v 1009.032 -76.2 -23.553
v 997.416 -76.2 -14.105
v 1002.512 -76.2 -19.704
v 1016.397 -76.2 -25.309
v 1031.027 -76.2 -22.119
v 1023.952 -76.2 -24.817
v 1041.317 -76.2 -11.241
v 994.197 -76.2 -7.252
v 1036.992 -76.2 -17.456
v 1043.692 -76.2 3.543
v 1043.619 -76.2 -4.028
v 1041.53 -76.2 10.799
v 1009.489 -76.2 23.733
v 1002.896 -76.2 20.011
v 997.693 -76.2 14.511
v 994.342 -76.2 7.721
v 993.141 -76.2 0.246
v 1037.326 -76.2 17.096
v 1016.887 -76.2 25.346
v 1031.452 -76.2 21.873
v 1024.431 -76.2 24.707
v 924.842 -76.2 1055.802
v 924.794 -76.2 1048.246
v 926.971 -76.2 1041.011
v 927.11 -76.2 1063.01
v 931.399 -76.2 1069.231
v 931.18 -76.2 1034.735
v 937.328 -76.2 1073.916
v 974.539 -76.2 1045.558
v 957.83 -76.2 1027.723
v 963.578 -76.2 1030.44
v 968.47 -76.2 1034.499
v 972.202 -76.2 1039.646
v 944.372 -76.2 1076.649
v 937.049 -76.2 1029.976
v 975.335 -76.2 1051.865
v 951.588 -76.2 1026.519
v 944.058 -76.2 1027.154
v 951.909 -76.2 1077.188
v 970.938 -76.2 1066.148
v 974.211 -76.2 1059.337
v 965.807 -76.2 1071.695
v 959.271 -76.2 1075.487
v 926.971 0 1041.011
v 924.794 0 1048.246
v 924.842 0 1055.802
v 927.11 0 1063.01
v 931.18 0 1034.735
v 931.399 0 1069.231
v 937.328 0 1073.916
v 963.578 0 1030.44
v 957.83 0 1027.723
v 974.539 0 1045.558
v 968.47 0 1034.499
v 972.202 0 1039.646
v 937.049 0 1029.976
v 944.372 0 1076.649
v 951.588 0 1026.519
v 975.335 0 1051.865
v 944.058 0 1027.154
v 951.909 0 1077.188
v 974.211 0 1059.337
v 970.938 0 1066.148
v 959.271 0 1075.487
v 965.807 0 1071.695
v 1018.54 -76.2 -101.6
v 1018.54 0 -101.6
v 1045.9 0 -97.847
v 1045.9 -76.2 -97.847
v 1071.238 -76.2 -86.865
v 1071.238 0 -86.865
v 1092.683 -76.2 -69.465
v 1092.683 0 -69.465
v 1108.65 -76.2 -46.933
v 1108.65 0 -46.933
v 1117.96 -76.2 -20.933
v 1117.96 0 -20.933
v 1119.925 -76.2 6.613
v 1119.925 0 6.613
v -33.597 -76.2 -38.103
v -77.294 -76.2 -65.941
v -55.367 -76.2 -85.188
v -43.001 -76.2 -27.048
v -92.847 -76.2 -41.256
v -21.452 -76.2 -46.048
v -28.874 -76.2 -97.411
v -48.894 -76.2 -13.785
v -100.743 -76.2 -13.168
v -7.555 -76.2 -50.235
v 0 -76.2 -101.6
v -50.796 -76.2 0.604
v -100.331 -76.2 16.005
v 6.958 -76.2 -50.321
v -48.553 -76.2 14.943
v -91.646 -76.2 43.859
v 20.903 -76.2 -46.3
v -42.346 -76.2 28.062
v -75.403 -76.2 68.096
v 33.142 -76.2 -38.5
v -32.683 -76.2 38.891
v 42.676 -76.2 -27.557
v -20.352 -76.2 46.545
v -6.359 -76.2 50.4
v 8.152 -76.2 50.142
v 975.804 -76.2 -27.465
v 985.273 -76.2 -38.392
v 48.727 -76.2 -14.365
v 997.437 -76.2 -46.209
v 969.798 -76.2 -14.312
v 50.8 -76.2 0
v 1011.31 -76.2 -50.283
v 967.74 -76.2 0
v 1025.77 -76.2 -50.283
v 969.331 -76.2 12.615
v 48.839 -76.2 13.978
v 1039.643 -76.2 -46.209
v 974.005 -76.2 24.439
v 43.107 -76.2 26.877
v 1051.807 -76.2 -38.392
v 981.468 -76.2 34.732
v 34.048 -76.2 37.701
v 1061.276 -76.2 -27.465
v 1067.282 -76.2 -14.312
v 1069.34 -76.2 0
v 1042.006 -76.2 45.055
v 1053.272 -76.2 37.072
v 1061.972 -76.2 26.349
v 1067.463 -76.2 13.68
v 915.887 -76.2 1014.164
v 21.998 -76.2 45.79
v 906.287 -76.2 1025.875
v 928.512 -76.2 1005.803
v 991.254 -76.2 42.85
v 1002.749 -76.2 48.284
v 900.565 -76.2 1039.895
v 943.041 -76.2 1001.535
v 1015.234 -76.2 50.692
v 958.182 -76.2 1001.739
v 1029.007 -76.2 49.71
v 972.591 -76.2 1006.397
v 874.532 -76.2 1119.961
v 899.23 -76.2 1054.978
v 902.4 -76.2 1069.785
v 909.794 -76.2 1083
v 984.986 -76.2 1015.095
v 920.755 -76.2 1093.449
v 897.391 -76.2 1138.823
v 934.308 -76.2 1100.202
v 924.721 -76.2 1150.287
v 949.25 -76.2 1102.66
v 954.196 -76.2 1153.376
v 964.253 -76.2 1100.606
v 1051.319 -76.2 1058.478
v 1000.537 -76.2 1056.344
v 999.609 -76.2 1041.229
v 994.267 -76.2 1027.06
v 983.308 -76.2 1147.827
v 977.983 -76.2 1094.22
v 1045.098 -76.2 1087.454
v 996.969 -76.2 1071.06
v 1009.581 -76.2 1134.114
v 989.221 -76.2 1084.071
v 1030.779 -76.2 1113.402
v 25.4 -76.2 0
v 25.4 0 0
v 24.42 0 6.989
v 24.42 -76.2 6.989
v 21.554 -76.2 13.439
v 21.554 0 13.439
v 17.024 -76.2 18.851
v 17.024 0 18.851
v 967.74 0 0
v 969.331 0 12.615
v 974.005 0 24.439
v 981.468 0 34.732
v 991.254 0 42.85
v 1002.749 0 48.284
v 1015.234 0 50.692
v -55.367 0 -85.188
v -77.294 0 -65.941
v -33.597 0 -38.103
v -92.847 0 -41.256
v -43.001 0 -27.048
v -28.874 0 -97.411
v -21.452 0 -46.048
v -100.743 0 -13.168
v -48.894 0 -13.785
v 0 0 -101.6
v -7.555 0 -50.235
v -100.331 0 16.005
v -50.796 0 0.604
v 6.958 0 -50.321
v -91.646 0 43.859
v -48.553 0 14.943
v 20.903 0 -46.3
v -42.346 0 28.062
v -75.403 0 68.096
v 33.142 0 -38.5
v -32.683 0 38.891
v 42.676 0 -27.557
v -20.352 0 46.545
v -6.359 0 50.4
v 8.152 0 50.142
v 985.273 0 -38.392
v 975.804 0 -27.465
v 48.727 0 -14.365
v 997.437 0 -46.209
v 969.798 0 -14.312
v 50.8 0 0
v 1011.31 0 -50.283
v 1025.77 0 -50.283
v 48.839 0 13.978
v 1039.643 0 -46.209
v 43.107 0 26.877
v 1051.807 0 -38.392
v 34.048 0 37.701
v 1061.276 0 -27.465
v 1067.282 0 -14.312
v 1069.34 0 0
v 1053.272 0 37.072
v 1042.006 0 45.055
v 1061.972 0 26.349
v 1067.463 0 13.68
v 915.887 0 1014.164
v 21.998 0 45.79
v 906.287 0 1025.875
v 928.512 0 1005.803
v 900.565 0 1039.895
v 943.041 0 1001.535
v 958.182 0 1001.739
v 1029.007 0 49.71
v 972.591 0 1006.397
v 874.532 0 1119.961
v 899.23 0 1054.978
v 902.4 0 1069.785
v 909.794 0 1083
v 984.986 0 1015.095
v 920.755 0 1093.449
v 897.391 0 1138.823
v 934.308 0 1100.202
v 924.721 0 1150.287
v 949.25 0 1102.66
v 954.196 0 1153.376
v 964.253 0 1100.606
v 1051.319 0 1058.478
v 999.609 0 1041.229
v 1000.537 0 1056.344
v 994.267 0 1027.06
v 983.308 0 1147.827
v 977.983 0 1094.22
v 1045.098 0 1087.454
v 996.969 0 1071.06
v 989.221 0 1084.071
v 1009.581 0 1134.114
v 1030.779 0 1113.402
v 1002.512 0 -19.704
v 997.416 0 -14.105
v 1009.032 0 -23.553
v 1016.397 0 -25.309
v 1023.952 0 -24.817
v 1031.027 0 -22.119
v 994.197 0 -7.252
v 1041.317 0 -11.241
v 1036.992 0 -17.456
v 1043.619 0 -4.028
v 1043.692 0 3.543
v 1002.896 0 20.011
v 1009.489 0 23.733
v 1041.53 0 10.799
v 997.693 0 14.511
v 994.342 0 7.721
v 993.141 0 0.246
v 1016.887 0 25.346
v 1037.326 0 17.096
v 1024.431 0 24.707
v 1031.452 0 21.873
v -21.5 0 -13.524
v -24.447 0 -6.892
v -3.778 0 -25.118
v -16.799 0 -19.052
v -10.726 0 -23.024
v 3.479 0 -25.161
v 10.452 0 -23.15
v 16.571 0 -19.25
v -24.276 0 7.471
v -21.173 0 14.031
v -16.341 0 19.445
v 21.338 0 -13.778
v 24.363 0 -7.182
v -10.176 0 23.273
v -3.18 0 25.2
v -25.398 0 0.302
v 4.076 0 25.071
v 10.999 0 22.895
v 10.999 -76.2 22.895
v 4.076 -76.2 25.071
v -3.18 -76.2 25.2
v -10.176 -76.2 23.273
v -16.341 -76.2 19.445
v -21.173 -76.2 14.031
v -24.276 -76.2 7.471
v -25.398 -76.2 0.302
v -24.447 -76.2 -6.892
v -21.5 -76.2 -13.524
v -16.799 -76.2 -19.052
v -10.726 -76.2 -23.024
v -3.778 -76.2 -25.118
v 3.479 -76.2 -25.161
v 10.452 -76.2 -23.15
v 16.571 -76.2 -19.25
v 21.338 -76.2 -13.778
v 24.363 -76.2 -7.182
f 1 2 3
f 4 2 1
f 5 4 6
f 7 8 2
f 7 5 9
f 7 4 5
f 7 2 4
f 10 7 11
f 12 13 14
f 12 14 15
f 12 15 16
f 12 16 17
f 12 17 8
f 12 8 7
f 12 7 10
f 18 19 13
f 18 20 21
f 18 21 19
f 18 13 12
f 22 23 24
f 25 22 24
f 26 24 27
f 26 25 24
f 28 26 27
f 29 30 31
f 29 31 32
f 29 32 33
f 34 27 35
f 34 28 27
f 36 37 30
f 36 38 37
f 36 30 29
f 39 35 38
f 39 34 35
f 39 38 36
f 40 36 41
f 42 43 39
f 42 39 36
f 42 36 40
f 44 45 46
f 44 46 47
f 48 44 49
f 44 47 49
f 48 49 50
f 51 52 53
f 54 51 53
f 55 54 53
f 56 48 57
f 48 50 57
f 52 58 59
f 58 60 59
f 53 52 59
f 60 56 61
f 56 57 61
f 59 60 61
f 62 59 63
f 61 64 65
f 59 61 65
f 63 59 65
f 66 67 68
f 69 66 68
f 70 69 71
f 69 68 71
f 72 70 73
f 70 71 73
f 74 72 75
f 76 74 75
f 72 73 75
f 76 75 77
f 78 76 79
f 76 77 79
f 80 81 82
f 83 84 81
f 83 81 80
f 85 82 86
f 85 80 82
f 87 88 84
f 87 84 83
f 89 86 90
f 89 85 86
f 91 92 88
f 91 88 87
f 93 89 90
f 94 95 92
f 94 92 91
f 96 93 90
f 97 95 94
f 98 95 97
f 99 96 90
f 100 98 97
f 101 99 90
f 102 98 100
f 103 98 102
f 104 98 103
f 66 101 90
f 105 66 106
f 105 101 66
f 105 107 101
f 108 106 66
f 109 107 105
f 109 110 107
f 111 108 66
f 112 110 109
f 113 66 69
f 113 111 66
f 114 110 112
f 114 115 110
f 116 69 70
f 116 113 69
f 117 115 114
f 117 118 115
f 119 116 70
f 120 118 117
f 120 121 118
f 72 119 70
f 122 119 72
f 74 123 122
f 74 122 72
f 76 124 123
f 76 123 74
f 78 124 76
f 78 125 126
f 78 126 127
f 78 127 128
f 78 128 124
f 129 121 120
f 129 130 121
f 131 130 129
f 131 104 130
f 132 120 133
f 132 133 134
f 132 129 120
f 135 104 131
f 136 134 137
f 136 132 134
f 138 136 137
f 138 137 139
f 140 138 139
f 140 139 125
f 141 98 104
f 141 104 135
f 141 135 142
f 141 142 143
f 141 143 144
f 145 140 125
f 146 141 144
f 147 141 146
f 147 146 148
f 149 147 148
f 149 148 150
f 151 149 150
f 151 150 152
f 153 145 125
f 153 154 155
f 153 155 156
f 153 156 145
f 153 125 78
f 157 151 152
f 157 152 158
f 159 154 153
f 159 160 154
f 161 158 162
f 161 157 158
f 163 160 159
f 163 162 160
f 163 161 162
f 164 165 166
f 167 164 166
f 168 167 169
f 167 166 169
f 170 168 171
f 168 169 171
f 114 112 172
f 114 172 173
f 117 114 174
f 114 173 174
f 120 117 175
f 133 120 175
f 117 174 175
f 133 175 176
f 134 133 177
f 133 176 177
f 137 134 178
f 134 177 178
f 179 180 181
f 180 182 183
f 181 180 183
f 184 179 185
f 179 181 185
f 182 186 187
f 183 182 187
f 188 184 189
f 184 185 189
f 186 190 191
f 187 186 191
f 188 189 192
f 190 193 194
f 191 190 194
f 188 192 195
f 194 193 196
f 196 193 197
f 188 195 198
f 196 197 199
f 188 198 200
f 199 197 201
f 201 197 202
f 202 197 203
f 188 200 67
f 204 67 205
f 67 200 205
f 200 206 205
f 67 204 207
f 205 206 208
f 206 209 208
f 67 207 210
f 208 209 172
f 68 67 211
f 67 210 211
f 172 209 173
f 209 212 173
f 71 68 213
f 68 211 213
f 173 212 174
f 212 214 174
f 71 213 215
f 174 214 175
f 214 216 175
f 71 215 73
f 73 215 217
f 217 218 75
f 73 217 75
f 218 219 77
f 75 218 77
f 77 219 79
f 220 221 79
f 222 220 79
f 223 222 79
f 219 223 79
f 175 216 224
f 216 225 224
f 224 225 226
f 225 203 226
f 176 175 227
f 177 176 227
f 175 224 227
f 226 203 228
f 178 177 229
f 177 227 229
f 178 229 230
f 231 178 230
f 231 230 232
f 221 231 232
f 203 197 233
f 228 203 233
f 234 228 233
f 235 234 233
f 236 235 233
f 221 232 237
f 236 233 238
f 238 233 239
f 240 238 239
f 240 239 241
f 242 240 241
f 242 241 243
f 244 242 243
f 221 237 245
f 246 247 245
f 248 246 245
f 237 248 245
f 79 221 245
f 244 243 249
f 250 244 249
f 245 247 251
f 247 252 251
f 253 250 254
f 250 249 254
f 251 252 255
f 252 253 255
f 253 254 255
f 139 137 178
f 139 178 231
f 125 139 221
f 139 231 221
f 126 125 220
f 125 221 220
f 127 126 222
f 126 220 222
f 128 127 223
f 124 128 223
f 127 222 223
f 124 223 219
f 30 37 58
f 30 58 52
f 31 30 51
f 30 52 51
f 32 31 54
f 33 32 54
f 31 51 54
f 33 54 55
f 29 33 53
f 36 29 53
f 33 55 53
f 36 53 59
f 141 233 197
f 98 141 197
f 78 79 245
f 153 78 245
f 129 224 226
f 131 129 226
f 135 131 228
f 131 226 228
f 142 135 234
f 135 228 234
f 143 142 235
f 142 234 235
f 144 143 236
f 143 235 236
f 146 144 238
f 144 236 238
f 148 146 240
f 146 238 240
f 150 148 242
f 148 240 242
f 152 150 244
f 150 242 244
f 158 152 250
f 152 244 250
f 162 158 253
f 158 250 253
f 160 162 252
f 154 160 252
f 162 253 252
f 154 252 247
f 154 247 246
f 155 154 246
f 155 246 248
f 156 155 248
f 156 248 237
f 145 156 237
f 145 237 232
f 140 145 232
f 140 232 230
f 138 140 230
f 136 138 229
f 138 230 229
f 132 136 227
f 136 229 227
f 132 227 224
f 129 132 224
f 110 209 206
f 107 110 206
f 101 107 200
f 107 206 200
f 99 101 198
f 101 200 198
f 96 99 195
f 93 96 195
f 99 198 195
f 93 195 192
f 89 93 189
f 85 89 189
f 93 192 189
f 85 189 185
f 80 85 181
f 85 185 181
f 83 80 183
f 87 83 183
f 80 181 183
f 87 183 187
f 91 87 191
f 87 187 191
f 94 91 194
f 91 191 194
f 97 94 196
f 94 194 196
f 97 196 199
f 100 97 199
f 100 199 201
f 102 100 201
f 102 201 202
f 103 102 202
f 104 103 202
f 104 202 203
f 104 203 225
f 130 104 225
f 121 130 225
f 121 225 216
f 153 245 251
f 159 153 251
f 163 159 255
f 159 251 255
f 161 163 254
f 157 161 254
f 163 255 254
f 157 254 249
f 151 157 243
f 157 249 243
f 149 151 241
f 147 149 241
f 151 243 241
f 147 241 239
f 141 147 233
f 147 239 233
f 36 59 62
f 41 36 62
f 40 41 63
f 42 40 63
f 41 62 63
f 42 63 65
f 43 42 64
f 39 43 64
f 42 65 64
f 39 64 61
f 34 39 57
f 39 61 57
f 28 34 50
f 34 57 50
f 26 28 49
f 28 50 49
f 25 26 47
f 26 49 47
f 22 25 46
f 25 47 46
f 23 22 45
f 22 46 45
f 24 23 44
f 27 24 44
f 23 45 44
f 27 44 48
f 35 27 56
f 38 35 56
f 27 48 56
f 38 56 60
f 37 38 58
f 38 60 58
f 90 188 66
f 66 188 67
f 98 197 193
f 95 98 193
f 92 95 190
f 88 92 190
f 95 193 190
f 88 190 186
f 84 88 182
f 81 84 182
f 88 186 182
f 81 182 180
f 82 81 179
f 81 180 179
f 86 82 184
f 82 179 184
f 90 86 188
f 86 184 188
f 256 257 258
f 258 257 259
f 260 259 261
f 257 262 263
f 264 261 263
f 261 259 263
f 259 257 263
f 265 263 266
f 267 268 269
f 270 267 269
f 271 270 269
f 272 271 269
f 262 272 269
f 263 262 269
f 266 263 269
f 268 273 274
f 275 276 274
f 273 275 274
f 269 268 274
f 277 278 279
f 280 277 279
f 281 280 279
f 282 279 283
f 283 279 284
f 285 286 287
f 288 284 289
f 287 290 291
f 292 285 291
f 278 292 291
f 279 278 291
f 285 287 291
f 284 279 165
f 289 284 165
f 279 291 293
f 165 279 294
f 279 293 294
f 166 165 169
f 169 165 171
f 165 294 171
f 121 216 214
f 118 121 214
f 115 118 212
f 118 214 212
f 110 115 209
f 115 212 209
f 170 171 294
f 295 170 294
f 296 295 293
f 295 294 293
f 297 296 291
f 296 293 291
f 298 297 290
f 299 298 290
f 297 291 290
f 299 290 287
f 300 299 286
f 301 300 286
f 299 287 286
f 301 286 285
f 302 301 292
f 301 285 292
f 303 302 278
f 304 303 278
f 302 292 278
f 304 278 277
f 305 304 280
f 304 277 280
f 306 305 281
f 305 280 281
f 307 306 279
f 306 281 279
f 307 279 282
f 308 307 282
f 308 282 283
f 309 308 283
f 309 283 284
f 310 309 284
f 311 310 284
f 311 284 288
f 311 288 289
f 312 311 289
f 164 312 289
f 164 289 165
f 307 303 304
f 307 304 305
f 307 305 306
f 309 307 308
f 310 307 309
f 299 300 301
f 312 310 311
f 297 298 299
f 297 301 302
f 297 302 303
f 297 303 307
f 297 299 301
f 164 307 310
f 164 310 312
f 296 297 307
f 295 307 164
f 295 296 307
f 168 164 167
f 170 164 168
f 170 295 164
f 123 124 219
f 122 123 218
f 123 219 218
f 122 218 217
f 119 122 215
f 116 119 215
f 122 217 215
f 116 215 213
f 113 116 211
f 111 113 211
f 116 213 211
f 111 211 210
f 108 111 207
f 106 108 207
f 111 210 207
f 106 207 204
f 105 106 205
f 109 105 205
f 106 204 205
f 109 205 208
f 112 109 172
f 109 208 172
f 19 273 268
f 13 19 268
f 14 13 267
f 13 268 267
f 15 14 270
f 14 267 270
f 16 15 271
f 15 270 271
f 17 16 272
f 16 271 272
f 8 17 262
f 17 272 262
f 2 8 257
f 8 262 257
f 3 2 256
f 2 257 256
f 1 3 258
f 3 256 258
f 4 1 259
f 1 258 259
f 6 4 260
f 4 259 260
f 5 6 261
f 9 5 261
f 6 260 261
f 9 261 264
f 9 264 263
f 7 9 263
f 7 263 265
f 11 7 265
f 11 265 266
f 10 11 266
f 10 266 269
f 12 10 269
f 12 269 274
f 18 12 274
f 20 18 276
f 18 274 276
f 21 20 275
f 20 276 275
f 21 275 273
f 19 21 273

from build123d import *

# Parameters (mm, degrees)
F1_DEPTH = 76.2


# Not quite as in the source:
# - ends of sketch curves that miss each other by under 0.0002 mm in the source are joined


with BuildPart() as f1:
    # F0 (on Front) → F1 (new body)
    with BuildSketch(Plane.XZ):
        with BuildLine():
            Line((874.5321444168, 1119.9607458335), (-75.4025189249, 68.0956794957))
            ThreePointArc((-75.4025189249, 68.0956794957), (-92.8468646719, -41.2555416955), (0, -101.6))
            Line((0, -101.6), (1018.54, -101.6))
            ThreePointArc((1018.54, -101.6), (1092.6830925881, -69.4648243464), (1119.9245847073, 6.6125625695))
            Line((1119.9245847073, 6.6125625695), (1051.3192480489, 1058.4776289074))
            ThreePointArc((1051.3192480489, 1058.4776289074), (983.3084595803, 1147.8272970572), (874.5321444168, 1119.9607458335))
        make_face()
        with BuildLine():
            Line((967.74, 0), (50.8, 0))
            ThreePointArc((50.8, 0), (-46.423432336, -20.6277708478), (34.0478373958, 37.701256858))
            Line((34.0478373958, 37.701256858), (915.8868259459, 1014.1638094799))
            ThreePointArc((915.8868259459, 1014.1638094799), (929.3068924939, 1098.2884986738), (1000.7346633416, 1051.8650663379))
            ThreePointArc((1000.7346633416, 1051.8650663379), (987.0062096357, 1017.1326541647), (953.2409446264, 1001.1727739842))
            Line((953.2409446264, 1001.1727739842), (1015.2337187153, 50.6922923536))
            ThreePointArc((1015.2337187153, 50.6922923536), (1053.2724121732, 37.0715462941), (1069.34, 0))
            ThreePointArc((1069.34, 0), (1018.54, -50.8), (967.74, 0))
        make_face(mode=Mode.SUBTRACT)
        with BuildLine():
            ThreePointArc((34.0478373958, 37.701256858), (46.423432336, 20.6277708478), (50.8, 0))
            Line((50.8, 0), (967.74, 0))
            ThreePointArc((967.74, 0), (981.4684537059, 34.7324121732), (1015.2337187153, 50.6922923536))
            Line((1015.2337187153, 50.6922923536), (953.2409446264, 1001.1727739842))
            ThreePointArc((953.2409446264, 1001.1727739842), (933.2477652223, 1003.8839509782), (915.8868259459, 1014.1638094799))
            Line((915.8868259459, 1014.1638094799), (34.0478373958, 37.701256858))
        make_face()
    extrude(amount=F1_DEPTH)


with BuildPart() as f1b:
    # F0 (on Front) → F1, piece 2 (new body)
    with BuildSketch(Plane.XZ):
        with BuildLine():
            Line((25.4, 0), (0, 0))
            Line((0, 0), (17.0239186979, 18.850628429))
            ThreePointArc((17.0239186979, 18.850628429), (-23.211716168, -10.3138854239), (25.4, 0))
        make_face()
        with BuildLine():
            Line((17.0239186979, 18.850628429), (0, 0))
            Line((0, 0), (25.4, 0))
            ThreePointArc((25.4, 0), (23.211716168, 10.3138854239), (17.0239186979, 18.850628429))
        make_face()
    extrude(amount=F1_DEPTH)


with BuildPart() as f1c:
    # F0 (on Front) → F1, piece 3 (new body)
    with BuildSketch(Plane.XZ):
        with BuildLine():
            Line((1018.54, 0), (993.14, 0))
            ThreePointArc((993.14, 0), (1018.54, -25.4), (1043.94, 0))
            ThreePointArc((1043.94, 0), (1035.9062060866, 18.535773147), (1016.8868593576, 25.3461461768))
            Line((1016.8868593576, 25.3461461768), (1018.54, 0))
        make_face()
        with BuildLine():
            ThreePointArc((1016.8868593576, 25.3461461768), (1000.004226853, 17.3662060866), (993.14, 0))
            Line((993.14, 0), (1018.54, 0))
            Line((1018.54, 0), (1016.8868593576, 25.3461461768))
        make_face()
    extrude(amount=F1_DEPTH)


with BuildPart() as f1d:
    # F0 (on Front) → F1, piece 4 (new body)
    with BuildSketch(Plane.XZ):
        with BuildLine():
            Line((949.9346633416, 1051.8650663379), (932.9107446438, 1033.0144379089))
            ThreePointArc((932.9107446438, 1033.0144379089), (941.591214282, 1027.8745086581), (951.587803984, 1026.5189201611))
            Line((951.587803984, 1026.5189201611), (949.9346633416, 1051.8650663379))
        make_face()
        with BuildLine():
            ThreePointArc((975.3346633416, 1051.8650663379), (939.6207779178, 1075.0767825059), (932.9107446438, 1033.0144379089))
            Line((932.9107446438, 1033.0144379089), (949.9346633416, 1051.8650663379))
            Line((949.9346633416, 1051.8650663379), (951.587803984, 1026.5189201611))
            ThreePointArc((951.587803984, 1026.5189201611), (968.4704364887, 1034.4988602513), (975.3346633416, 1051.8650663379))
        make_face()
    extrude(amount=F1_DEPTH)


solid = Compound([f1.part, f1b.part, f1c.part, f1d.part])
